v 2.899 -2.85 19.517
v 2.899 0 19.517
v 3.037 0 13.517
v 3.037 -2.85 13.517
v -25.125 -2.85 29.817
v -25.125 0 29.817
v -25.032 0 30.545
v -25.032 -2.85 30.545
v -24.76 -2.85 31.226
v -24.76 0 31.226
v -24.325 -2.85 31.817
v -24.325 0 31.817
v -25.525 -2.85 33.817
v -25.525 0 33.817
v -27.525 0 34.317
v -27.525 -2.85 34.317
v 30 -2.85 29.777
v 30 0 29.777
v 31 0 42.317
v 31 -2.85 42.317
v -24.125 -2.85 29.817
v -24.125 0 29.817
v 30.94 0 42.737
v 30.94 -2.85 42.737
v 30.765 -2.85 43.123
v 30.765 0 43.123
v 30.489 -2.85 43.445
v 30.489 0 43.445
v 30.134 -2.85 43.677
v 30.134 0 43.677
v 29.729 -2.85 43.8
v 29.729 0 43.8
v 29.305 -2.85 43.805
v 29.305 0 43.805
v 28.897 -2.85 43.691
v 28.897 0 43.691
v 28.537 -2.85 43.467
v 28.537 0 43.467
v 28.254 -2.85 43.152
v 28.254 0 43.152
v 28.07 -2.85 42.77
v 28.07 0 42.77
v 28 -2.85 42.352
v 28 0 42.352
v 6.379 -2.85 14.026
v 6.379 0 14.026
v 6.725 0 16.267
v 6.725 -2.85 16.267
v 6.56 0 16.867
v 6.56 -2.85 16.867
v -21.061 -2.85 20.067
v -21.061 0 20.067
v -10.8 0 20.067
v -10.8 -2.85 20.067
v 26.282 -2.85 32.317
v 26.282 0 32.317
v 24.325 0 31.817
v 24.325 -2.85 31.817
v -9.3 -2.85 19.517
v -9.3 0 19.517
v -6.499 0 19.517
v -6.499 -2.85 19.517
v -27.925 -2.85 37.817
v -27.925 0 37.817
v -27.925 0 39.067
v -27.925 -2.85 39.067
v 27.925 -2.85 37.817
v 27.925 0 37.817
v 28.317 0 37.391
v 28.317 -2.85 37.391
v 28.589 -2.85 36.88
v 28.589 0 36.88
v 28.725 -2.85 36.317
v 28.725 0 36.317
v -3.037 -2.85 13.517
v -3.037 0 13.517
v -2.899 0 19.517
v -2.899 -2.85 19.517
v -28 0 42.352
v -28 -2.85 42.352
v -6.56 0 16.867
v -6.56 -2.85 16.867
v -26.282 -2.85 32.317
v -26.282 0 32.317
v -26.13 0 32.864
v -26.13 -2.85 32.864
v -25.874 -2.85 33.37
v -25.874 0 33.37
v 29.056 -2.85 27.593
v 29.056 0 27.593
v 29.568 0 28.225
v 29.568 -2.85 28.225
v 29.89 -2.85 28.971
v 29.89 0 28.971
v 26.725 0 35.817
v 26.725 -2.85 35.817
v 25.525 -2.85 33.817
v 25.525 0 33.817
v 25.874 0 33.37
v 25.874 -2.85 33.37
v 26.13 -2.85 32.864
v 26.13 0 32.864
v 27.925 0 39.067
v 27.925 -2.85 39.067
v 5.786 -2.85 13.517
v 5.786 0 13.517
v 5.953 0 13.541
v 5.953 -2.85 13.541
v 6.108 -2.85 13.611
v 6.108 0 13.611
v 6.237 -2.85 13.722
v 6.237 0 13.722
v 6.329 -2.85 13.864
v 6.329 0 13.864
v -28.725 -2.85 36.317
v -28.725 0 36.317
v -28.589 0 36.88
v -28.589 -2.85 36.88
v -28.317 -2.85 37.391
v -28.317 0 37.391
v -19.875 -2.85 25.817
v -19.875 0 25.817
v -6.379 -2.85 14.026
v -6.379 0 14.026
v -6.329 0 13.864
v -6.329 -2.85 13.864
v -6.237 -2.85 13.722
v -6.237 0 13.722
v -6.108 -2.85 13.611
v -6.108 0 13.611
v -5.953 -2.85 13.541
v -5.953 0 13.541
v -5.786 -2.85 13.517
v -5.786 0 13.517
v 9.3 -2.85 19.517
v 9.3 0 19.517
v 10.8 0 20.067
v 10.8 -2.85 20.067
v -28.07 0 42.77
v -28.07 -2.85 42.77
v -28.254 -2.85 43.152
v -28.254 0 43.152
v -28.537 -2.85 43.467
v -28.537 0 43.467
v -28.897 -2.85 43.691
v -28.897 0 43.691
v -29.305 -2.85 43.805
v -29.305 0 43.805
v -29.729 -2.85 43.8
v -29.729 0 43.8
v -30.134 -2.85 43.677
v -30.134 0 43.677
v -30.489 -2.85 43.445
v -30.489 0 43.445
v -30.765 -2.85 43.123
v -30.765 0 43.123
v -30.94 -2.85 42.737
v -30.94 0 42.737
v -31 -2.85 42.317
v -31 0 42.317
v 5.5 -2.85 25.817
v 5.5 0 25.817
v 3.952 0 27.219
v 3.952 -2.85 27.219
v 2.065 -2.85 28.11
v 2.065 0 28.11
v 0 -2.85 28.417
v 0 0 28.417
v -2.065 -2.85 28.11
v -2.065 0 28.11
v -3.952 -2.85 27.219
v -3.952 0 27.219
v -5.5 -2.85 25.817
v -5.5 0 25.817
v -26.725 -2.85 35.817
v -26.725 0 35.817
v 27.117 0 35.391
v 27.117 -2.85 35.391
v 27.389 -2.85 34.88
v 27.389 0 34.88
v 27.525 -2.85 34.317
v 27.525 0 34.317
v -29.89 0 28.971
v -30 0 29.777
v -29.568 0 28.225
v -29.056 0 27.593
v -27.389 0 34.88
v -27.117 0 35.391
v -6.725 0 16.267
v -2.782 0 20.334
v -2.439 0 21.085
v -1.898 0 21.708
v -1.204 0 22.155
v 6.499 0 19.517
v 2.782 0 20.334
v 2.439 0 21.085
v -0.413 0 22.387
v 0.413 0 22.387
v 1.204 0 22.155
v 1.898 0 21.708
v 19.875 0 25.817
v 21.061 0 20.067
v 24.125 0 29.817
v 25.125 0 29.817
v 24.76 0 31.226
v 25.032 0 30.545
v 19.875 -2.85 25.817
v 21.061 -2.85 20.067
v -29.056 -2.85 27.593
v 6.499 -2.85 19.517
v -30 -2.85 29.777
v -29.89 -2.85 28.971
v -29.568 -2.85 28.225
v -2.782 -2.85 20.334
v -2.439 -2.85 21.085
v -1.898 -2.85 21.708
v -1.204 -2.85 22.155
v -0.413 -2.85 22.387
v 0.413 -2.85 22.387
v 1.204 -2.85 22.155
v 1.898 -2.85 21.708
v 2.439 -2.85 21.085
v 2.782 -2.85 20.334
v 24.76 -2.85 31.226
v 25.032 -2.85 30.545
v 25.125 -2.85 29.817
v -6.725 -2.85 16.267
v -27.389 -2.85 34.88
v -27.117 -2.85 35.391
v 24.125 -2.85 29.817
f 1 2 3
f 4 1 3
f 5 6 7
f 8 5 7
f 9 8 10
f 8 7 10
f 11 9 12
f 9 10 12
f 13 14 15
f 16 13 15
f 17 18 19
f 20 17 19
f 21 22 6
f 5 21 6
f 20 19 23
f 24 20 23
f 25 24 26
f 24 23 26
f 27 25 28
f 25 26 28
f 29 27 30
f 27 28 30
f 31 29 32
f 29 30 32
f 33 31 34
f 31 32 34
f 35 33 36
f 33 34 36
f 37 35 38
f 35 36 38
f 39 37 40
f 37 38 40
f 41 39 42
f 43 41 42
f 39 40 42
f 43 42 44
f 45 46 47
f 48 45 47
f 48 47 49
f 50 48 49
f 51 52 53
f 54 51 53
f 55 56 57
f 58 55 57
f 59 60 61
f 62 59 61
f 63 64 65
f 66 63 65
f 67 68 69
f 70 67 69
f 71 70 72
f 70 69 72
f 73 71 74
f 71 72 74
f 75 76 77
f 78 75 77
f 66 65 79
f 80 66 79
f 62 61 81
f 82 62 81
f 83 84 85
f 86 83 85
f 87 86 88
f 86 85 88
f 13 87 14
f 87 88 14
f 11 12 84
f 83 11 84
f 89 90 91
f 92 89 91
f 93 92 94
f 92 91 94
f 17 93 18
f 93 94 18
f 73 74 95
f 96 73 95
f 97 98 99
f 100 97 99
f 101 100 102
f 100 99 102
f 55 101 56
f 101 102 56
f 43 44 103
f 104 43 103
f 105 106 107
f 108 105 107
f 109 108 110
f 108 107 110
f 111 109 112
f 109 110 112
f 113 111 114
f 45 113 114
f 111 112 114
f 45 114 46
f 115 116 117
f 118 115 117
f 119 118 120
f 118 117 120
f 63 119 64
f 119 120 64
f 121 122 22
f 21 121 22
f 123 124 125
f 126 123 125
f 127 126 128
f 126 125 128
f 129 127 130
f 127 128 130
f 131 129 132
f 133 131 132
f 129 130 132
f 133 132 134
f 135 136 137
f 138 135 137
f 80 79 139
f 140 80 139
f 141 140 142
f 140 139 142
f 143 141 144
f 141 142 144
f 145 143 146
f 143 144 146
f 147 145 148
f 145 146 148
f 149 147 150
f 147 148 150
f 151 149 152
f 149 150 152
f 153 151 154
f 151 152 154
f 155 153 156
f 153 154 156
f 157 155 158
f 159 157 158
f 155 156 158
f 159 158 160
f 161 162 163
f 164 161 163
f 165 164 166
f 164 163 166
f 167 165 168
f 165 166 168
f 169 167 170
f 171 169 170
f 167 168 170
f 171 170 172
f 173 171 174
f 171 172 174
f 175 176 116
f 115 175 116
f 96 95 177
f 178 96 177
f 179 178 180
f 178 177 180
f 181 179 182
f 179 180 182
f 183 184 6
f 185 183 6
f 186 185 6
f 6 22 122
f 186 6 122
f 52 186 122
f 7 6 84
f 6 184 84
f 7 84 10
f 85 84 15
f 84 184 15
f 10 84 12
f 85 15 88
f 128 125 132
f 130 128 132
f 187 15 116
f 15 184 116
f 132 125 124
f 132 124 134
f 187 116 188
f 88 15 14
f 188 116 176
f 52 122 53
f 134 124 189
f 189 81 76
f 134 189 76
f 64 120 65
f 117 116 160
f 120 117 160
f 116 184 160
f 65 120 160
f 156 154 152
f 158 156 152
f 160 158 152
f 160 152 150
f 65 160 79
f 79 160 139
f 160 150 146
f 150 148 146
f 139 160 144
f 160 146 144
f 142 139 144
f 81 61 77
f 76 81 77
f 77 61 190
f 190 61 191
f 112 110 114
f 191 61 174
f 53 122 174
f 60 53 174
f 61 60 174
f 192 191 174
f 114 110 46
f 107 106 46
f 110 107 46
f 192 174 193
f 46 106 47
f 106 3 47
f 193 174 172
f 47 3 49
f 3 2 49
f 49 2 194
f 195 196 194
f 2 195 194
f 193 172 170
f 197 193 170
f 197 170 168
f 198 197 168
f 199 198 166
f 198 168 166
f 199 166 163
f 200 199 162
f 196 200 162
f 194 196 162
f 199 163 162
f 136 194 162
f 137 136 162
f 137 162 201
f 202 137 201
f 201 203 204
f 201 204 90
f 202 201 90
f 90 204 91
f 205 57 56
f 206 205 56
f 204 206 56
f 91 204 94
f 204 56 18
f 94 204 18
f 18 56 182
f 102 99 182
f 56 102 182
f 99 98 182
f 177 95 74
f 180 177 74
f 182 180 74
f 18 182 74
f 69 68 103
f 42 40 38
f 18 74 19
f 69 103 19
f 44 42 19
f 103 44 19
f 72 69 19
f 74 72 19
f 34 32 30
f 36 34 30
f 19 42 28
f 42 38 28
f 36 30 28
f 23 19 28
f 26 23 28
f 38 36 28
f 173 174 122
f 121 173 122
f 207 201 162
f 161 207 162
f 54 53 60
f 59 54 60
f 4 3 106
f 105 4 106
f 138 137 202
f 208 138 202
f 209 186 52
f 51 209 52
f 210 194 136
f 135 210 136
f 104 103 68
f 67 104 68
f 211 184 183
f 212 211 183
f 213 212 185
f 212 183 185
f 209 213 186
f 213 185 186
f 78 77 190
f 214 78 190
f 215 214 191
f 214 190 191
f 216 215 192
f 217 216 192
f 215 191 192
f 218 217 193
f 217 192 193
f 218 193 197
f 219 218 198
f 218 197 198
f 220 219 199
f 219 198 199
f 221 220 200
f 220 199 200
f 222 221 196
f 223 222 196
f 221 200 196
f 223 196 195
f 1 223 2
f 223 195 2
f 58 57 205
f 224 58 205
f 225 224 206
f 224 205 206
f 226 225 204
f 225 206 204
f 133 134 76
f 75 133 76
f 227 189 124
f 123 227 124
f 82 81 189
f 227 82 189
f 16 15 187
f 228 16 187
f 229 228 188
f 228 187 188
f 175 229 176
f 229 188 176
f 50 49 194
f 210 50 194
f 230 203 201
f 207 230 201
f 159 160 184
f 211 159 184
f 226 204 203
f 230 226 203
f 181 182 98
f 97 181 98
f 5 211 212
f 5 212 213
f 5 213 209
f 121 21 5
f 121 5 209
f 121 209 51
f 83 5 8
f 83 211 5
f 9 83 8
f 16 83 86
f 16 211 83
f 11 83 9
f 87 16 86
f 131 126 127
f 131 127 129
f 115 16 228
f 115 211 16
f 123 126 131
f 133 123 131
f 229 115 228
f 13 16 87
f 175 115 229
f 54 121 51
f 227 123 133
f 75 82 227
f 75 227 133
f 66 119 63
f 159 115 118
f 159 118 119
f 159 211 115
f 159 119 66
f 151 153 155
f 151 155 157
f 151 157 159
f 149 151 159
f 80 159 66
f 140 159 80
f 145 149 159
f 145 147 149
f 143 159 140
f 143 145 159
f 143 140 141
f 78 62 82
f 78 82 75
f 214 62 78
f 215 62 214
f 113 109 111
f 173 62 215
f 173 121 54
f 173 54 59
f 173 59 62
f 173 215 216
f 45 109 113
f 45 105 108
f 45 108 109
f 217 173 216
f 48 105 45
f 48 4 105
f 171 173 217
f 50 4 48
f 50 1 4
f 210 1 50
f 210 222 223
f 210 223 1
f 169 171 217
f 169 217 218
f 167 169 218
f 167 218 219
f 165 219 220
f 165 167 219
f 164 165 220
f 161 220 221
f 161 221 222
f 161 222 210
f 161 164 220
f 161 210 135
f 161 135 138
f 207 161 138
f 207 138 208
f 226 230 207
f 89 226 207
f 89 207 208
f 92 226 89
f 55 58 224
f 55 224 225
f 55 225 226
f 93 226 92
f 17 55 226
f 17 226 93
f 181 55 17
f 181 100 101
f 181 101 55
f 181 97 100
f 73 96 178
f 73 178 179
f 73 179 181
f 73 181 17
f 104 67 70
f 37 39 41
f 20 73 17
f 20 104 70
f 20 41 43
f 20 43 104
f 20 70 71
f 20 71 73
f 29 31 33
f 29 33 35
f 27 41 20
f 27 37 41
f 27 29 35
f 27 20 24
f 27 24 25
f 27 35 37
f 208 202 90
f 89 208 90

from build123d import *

# Parameters (mm, degrees)
F1_DEPTH = 2.85


with BuildPart() as f1:
    # F0 (on Front) → F1 (new body)
    with BuildSketch(Plane.XZ):
        with BuildLine():
            Line((-5.5, 25.817474), (-19.875, 25.817474))
            Line((-19.875, 25.817474), (-24.125, 29.817474))
            Line((-24.125, 29.817474), (-25.125, 29.817474))
            ThreePointArc((-25.125, 29.817474), (-24.917582, 30.894507), (-24.325, 31.817474))
            Line((-24.325, 31.817474), (-26.281571, 32.317474))
            ThreePointArc((-26.281571, 32.317474), (-26.014286, 33.123461), (-25.525, 33.817474))
            Line((-25.525, 33.817474), (-27.524757, 34.317474))
            ThreePointArc((-27.524757, 34.317474), (-27.269126, 35.144383), (-26.725, 35.817474))
            Line((-26.725, 35.817474), (-28.724757, 36.317474))
            ThreePointArc((-28.724757, 36.317474), (-28.469126, 37.144383), (-27.925, 37.817474))
            Line((-27.925, 37.817474), (-27.925, 39.067474))
            Line((-27.925, 39.067474), (-28.000395, 42.351898))
            ThreePointArc((-28.000395, 42.351898), (-29.517213, 43.817376), (-31, 42.317474))
            Line((-31, 42.317474), (-30.000272, 29.777114))
            ThreePointArc((-30.000272, 29.777114), (-29.754203, 28.587215), (-29.056366, 27.592514))
            Line((-29.056366, 27.592514), (-21.061011, 20.067474))
            Line((-21.061011, 20.067474), (-10.8, 20.067474))
            Line((-10.8, 20.067474), (-9.3, 19.517474))
            Line((-9.3, 19.517474), (-6.49904, 19.517474))
            Line((-6.49904, 19.517474), (-6.560163, 16.867474))
            Line((-6.560163, 16.867474), (-6.725, 16.267474))
            Line((-6.725, 16.267474), (-6.378565, 14.025835))
            ThreePointArc((-6.378565, 14.025835), (-6.176127, 13.661962), (-5.785604, 13.517474))
            Line((-5.785604, 13.517474), (-3.037433, 13.517474))
            Line((-3.037433, 13.517474), (-2.89904, 19.517474))
            ThreePointArc((-2.89904, 19.517474), (0, 22.416514), (2.89904, 19.517474))
            Line((2.89904, 19.517474), (3.037433, 13.517474))
            Line((3.037433, 13.517474), (5.785604, 13.517474))
            ThreePointArc((5.785604, 13.517474), (6.176127, 13.661962), (6.378565, 14.025835))
            Line((6.378565, 14.025835), (6.725, 16.267474))
            Line((6.725, 16.267474), (6.560163, 16.867474))
            Line((6.560163, 16.867474), (6.49904, 19.517474))
            Line((6.49904, 19.517474), (9.3, 19.517474))
            Line((9.3, 19.517474), (10.8, 20.067474))
            Line((10.8, 20.067474), (21.061011, 20.067474))
            Line((21.061011, 20.067474), (29.056366, 27.592514))
            ThreePointArc((29.056366, 27.592514), (29.754203, 28.587215), (30.000272, 29.777114))
            Line((30.000272, 29.777114), (31, 42.317474))
            ThreePointArc((31, 42.317474), (29.517213, 43.817376), (28.000395, 42.351898))
            Line((28.000395, 42.351898), (27.925, 39.067474))
            Line((27.925, 39.067474), (27.925, 37.817474))
            ThreePointArc((27.925, 37.817474), (28.469126, 37.144383), (28.724757, 36.317474))
            Line((28.724757, 36.317474), (26.725, 35.817474))
            ThreePointArc((26.725, 35.817474), (27.269126, 35.144383), (27.524757, 34.317474))
            Line((27.524757, 34.317474), (25.525, 33.817474))
            ThreePointArc((25.525, 33.817474), (26.014286, 33.123461), (26.281571, 32.317474))
            Line((26.281571, 32.317474), (24.325, 31.817474))
            ThreePointArc((24.325, 31.817474), (24.917582, 30.894507), (25.125, 29.817474))
            Line((25.125, 29.817474), (24.125, 29.817474))
            Line((24.125, 29.817474), (19.875, 25.817474))
            Line((19.875, 25.817474), (5.5, 25.817474))
            ThreePointArc((5.5, 25.817474), (0, 28.416514), (-5.5, 25.817474))
        make_face()
    extrude(amount=F1_DEPTH)


solid = f1.part
